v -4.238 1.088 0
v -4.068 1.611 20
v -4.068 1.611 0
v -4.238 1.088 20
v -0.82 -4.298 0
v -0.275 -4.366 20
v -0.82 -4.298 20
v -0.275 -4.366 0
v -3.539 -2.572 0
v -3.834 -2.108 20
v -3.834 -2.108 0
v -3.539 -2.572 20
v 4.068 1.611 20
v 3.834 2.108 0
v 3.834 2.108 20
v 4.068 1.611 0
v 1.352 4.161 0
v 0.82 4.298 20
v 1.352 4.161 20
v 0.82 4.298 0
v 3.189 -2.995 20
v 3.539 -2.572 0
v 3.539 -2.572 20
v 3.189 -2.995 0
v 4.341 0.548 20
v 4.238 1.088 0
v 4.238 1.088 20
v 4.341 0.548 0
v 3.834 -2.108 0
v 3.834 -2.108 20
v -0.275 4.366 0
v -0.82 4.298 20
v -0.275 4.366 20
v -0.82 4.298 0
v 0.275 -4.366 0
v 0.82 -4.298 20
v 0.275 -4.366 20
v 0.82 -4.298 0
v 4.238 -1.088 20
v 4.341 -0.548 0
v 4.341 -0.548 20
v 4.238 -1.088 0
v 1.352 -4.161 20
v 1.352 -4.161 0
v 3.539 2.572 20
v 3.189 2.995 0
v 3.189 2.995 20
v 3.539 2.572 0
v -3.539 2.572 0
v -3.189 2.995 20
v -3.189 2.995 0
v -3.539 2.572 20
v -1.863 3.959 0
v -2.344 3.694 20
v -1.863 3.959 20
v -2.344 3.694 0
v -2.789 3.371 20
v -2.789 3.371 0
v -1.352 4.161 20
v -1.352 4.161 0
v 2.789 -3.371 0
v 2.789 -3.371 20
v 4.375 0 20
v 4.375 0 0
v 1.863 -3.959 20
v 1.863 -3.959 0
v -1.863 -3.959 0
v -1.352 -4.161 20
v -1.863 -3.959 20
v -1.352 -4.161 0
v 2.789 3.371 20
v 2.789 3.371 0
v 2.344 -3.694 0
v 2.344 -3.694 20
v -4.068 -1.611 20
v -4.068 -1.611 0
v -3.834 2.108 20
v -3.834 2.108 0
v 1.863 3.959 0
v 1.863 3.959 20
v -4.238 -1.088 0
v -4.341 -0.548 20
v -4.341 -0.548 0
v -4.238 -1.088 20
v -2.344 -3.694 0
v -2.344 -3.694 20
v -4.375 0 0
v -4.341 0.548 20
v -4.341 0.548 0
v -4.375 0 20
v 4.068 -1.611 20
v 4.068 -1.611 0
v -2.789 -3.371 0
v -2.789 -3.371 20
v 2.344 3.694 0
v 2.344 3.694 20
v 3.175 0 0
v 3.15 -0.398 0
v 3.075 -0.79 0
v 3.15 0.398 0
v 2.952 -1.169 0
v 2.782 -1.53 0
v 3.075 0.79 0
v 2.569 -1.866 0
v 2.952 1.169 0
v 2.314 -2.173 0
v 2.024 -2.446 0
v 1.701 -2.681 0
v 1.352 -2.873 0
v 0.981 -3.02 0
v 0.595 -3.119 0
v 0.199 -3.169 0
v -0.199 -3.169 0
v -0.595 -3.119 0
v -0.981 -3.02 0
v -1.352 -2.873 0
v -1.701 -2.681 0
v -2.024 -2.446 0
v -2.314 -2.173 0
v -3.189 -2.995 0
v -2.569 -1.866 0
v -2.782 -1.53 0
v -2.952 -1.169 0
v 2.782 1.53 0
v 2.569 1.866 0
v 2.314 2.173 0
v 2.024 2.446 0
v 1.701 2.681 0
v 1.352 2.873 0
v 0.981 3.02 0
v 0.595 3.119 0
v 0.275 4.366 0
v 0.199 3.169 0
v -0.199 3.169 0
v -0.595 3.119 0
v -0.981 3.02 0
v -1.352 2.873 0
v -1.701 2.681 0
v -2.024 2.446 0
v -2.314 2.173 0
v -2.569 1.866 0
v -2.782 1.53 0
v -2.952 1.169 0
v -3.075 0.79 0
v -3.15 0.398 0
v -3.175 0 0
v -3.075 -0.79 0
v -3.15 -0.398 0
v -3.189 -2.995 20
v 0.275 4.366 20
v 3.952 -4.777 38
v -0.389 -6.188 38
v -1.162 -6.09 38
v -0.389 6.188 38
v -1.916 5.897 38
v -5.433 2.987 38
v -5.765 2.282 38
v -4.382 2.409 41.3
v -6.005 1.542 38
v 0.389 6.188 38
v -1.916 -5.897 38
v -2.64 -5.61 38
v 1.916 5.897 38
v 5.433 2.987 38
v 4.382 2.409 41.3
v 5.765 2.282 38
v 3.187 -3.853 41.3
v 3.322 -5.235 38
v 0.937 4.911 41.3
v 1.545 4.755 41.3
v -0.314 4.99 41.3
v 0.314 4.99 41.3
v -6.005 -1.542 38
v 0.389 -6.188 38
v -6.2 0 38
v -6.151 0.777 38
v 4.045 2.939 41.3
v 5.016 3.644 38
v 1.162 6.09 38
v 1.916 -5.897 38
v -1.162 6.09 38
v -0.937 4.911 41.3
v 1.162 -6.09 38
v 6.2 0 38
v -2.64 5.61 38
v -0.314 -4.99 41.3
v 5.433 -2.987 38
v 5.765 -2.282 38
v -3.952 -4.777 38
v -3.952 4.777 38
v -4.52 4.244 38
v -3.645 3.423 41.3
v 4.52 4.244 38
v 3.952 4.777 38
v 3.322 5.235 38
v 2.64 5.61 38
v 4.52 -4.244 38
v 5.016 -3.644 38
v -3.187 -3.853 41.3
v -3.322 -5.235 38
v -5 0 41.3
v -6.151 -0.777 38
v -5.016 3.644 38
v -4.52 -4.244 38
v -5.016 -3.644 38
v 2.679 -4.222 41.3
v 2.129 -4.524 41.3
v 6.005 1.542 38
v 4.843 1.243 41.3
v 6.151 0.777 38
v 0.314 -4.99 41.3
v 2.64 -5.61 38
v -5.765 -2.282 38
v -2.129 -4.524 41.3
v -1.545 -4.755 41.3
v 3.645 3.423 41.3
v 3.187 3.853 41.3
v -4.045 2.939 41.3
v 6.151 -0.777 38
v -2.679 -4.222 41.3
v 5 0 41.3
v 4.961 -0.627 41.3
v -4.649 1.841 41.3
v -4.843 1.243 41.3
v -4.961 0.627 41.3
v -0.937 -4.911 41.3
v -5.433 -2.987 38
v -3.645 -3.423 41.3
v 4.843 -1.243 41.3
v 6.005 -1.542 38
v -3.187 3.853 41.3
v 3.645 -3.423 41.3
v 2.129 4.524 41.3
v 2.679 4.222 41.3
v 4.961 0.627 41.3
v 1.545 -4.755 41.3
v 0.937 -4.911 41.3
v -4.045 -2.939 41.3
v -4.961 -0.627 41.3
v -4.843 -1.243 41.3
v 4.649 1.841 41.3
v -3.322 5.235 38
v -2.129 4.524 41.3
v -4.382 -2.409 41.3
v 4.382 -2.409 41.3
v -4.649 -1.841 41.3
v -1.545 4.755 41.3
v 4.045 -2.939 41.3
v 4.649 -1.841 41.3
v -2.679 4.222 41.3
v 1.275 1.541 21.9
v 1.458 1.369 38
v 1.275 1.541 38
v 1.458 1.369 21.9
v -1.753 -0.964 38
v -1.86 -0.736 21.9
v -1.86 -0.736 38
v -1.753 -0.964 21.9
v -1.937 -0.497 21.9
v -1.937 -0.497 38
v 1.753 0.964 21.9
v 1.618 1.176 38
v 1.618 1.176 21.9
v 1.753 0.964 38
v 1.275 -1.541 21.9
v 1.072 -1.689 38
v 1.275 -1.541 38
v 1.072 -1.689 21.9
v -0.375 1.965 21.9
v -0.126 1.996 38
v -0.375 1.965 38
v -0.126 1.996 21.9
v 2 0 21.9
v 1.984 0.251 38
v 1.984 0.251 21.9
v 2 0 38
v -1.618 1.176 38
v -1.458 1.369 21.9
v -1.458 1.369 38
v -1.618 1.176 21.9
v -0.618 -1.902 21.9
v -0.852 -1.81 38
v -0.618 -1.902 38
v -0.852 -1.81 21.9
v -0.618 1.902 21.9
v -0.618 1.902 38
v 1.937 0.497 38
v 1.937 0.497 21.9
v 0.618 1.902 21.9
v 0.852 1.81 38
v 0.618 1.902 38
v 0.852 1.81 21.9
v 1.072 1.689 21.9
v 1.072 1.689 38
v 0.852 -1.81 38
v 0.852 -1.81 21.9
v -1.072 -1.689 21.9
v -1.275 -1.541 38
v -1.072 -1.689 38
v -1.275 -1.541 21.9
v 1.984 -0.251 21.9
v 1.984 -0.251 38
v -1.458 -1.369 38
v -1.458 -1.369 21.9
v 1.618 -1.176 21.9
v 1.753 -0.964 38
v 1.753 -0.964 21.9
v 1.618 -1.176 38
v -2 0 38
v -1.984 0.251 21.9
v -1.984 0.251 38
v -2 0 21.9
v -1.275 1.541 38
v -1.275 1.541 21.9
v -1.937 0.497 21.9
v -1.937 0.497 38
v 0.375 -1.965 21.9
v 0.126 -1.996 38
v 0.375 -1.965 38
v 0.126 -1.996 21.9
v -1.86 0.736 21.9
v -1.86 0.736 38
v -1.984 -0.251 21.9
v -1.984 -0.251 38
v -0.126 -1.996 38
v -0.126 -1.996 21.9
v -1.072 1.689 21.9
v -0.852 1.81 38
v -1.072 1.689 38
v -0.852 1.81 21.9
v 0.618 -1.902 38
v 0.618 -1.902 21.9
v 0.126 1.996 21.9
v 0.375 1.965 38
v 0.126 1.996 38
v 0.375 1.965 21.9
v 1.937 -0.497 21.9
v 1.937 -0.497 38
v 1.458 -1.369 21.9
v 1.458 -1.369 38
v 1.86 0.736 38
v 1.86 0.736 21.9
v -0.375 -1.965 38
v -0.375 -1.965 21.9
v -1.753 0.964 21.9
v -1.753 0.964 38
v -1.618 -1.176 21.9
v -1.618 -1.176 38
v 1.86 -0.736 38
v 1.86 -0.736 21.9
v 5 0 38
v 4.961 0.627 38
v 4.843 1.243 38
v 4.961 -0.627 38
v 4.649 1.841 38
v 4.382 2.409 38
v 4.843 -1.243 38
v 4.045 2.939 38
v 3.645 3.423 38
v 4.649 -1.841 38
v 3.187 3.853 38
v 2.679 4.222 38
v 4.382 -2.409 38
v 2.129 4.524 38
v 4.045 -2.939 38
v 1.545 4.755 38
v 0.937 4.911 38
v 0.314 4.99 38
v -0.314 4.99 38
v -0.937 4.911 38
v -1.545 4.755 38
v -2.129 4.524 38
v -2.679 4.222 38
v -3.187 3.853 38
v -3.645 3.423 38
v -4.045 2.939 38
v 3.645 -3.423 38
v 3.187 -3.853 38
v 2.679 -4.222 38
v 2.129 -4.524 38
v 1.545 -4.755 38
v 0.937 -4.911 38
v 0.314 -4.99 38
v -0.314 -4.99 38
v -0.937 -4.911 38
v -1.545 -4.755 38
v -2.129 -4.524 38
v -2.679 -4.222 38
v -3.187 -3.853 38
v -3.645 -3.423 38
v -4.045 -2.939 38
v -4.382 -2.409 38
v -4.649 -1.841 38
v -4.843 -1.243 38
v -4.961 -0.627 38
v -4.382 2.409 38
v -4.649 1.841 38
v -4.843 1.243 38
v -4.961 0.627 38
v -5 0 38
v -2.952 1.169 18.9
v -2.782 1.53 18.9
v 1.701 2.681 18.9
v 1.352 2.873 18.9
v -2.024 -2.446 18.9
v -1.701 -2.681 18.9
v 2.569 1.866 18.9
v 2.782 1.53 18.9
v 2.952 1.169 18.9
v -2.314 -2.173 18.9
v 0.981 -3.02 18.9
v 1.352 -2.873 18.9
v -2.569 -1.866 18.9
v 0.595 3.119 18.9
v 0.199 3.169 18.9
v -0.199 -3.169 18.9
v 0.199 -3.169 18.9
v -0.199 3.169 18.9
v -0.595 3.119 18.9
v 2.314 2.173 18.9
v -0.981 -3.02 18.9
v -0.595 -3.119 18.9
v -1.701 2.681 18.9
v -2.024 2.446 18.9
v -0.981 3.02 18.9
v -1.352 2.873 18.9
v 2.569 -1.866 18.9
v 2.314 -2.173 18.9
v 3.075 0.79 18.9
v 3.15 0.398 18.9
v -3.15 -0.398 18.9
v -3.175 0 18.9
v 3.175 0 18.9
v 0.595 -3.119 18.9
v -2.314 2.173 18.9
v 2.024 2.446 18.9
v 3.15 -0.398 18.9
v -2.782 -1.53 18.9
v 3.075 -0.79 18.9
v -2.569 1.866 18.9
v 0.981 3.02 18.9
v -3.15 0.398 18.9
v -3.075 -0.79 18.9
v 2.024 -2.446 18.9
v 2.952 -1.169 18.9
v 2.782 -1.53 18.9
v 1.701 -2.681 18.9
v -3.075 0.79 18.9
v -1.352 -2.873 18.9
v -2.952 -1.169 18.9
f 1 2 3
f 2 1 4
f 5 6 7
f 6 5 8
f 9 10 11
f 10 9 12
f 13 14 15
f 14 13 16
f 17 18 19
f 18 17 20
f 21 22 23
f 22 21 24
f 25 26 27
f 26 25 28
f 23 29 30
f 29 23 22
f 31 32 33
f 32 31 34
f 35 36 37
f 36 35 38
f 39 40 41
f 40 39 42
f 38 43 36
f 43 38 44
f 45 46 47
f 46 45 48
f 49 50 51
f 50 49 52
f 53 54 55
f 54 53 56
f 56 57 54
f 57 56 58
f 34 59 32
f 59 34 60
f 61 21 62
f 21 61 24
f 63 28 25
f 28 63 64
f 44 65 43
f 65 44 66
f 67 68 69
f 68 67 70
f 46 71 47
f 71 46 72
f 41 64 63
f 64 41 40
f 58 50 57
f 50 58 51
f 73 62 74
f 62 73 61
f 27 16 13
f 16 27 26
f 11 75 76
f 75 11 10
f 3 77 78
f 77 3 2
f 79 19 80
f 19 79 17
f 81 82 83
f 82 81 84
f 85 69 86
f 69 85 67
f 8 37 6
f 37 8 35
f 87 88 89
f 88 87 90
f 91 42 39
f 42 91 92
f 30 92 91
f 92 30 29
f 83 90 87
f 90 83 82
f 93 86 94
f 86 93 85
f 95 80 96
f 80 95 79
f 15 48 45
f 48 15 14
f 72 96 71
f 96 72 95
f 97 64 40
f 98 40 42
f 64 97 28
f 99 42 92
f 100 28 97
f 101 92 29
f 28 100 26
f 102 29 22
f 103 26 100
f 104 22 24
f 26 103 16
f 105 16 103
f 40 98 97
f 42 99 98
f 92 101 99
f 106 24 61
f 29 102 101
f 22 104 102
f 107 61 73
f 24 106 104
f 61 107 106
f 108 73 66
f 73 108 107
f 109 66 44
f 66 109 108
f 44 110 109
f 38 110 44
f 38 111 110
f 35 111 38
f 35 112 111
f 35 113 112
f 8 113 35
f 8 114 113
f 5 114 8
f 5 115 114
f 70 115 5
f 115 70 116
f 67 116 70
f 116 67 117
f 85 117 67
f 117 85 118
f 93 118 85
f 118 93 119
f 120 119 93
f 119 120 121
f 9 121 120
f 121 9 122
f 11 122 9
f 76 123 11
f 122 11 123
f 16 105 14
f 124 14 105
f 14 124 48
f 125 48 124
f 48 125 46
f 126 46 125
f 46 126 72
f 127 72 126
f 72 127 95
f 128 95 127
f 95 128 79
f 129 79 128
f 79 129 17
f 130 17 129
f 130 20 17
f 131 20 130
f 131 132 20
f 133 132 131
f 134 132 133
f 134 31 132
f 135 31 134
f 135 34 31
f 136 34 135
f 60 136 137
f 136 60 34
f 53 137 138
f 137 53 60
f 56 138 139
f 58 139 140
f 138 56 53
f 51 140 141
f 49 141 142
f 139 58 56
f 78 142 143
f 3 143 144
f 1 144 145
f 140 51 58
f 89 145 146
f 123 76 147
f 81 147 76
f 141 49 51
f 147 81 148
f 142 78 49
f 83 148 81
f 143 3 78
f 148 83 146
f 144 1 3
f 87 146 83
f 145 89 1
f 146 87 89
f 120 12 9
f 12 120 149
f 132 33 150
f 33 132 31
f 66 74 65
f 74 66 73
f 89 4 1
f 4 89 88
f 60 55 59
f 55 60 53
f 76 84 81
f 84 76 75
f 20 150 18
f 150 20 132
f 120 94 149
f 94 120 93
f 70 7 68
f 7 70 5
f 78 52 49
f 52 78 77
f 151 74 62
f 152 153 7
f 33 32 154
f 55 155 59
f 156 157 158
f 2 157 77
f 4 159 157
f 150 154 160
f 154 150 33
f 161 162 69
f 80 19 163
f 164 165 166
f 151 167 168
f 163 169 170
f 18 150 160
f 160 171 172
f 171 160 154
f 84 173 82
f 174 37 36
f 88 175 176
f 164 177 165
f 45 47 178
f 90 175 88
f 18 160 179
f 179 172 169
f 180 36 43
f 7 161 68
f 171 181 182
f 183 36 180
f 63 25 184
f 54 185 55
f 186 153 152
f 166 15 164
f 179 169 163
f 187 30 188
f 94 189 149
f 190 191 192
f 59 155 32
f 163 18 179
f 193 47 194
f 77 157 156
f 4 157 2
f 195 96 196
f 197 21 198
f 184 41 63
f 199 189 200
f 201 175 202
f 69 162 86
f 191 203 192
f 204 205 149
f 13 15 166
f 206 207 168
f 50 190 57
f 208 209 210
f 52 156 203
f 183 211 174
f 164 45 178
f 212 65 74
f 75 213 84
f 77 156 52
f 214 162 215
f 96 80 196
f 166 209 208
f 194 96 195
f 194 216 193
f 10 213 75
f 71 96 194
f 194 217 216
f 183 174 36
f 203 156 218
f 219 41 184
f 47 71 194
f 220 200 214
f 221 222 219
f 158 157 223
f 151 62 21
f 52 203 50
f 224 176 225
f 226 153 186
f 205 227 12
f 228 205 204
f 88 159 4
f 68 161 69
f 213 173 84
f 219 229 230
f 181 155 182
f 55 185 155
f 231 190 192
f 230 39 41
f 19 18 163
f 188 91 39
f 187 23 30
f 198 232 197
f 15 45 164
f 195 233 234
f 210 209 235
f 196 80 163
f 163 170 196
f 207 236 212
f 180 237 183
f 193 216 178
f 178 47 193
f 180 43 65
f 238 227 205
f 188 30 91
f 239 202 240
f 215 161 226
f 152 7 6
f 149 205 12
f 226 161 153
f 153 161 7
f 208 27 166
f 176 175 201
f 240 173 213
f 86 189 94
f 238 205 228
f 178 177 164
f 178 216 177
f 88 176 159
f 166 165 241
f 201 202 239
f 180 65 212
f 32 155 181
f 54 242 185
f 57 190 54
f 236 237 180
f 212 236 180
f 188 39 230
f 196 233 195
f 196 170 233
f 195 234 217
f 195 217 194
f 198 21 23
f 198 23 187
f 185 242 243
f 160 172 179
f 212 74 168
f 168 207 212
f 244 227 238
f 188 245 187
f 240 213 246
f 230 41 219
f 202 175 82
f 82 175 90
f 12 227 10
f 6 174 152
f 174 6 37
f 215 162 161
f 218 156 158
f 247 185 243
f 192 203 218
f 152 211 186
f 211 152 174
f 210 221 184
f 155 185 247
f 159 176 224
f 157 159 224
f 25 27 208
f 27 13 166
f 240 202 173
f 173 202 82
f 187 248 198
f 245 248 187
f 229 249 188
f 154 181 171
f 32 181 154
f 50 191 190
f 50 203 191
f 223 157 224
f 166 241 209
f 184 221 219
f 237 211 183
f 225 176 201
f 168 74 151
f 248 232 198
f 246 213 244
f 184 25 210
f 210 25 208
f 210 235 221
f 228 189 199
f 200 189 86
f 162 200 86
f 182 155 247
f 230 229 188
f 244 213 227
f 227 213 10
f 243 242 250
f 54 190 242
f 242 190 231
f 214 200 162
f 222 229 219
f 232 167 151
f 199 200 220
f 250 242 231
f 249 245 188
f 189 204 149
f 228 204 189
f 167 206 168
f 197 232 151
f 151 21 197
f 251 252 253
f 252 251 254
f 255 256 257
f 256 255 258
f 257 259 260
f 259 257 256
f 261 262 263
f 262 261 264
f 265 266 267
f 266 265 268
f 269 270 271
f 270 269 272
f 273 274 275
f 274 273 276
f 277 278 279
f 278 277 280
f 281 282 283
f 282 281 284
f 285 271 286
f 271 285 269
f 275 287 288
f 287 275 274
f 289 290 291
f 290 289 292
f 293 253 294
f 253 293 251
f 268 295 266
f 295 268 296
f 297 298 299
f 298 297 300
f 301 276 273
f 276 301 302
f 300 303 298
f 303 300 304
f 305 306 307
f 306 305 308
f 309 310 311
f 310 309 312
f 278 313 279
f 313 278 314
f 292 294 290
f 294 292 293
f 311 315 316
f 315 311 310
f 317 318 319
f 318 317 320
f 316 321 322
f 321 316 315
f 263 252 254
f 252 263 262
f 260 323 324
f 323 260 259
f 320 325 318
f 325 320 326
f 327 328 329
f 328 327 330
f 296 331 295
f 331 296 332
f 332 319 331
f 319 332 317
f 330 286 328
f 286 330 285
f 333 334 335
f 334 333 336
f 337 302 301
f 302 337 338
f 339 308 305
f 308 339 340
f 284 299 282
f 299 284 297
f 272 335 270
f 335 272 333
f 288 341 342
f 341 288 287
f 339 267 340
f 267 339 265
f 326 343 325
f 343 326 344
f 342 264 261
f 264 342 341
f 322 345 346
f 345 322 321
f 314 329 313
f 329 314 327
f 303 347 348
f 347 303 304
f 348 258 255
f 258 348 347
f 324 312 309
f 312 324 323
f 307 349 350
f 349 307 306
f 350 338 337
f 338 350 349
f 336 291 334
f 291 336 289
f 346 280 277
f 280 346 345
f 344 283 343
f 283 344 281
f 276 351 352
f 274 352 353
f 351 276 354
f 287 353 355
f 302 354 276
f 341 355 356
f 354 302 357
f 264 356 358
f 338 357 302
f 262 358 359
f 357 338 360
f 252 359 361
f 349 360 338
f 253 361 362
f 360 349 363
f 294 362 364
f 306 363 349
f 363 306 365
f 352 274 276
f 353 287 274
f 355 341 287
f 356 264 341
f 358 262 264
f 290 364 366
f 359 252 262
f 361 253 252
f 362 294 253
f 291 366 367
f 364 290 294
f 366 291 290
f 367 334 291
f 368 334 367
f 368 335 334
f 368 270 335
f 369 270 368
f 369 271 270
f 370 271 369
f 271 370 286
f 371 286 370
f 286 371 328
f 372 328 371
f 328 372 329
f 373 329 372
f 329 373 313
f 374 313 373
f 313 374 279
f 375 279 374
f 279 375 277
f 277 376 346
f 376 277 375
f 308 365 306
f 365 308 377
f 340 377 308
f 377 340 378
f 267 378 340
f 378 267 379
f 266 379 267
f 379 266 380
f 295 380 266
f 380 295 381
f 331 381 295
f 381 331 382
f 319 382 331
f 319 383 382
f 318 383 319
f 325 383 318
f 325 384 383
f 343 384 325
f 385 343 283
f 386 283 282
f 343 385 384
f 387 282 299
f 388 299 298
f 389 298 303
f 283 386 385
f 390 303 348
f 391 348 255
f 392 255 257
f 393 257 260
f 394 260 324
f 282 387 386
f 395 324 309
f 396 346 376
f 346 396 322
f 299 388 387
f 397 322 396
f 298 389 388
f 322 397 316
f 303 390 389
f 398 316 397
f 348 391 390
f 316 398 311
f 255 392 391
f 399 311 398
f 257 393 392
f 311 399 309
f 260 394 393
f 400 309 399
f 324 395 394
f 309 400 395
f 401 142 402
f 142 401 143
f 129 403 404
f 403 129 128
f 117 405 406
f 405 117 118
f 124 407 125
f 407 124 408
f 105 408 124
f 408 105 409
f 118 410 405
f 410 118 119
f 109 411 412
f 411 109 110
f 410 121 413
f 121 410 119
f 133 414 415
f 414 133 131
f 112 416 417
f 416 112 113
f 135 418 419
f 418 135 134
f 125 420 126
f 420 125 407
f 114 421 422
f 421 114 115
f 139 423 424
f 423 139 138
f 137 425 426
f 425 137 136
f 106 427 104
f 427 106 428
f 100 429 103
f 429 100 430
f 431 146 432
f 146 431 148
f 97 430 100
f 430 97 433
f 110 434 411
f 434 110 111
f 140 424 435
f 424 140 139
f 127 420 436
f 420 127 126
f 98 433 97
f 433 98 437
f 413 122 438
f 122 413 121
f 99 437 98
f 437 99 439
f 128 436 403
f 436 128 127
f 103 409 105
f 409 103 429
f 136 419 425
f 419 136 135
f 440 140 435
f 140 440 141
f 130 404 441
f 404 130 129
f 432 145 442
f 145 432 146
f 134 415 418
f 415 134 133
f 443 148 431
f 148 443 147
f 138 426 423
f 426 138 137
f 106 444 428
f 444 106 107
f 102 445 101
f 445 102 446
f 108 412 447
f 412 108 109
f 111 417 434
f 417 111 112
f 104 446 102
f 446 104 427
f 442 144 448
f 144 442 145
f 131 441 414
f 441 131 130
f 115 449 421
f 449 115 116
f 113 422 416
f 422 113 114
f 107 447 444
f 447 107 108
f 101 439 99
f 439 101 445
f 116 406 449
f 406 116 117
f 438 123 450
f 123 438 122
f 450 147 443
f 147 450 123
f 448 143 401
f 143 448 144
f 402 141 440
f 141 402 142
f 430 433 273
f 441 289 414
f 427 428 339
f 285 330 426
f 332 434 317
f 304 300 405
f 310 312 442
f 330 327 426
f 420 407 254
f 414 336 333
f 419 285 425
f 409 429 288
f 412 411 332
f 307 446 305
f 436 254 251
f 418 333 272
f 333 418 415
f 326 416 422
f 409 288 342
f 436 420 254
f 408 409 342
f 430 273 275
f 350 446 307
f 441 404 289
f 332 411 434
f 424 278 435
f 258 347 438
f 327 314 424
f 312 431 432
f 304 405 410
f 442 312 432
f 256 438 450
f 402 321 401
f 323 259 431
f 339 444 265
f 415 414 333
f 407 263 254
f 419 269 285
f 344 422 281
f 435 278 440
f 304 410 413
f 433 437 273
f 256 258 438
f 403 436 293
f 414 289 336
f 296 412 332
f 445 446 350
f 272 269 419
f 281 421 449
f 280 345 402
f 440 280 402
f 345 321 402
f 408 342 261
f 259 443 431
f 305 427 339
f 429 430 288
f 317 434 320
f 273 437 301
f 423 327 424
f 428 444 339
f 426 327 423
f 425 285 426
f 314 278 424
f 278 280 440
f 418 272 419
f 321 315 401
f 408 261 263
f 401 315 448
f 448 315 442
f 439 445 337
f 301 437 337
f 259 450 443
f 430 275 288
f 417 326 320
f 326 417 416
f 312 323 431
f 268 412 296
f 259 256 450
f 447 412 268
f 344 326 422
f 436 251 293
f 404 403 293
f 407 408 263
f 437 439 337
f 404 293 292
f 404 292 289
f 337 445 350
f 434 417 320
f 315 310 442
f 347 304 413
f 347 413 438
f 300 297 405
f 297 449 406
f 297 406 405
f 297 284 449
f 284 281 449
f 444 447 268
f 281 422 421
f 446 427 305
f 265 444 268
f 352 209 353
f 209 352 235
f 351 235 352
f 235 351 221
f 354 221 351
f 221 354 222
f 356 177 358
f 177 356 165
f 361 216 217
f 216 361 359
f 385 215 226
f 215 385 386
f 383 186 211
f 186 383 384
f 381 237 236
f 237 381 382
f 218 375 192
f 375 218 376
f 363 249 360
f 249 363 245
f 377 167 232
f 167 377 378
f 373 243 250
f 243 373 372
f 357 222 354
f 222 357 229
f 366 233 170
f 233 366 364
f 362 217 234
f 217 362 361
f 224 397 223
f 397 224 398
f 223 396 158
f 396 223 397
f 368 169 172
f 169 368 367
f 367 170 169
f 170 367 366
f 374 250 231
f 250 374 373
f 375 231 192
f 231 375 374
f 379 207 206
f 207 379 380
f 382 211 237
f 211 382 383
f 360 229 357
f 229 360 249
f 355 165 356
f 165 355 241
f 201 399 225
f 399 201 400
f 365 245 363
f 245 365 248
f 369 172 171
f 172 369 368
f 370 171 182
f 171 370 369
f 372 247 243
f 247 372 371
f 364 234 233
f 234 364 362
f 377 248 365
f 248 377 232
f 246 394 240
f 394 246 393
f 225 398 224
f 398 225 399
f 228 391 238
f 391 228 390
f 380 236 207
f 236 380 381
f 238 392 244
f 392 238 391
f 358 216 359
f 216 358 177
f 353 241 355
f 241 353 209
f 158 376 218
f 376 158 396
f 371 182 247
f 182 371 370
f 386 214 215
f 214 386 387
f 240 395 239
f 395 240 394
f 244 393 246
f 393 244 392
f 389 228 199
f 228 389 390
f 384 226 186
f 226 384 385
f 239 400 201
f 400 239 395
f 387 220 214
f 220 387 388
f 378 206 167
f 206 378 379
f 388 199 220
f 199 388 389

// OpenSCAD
ROD_DIA = 6.35;
ROD_SIDE_LENGTH = 35; // 25;
ROD_SIDE_OFFSET = 20; // 10;

BALL_DIA = 10.2;
BALL_SIDE_LENGTH = 15;
BALL_OFFSET = 26;

MAGNET_DIA = 10;
MAGNET_THICKNESS = 3.3;
MAGNET_OFFSET = 12;
MAGNET_HOLE_DIA = 4;

SPRING_HOLE = false;
SPRING_HOLE_DIA = 2;
SPRING_HOLE_THICKNESS = 2.5;
SPRING_HOLE_OFFSET = 5.5;

WALL_THICKNESS = 1.2;


$fn = 50;

difference() {
  union() {
    cylinder(d = ROD_DIA + 2 * WALL_THICKNESS, h = ROD_SIDE_LENGTH);

    if(SPRING_HOLE) {
      translate([SPRING_HOLE_OFFSET, 0, 0])
      cylinder(d = SPRING_HOLE_DIA + 2 * WALL_THICKNESS, h = SPRING_HOLE_THICKNESS);
    }

    hull() {
      translate([0, 0, ROD_SIDE_OFFSET])
      cylinder(d = ROD_DIA + 2 * WALL_THICKNESS, h = ROD_SIDE_LENGTH - ROD_SIDE_OFFSET);

      translate([0, 0, ROD_SIDE_LENGTH + BALL_SIDE_LENGTH - MAGNET_OFFSET])
      cylinder(d1 = MAGNET_DIA + 2 * WALL_THICKNESS, d2 = MAGNET_DIA, h = MAGNET_THICKNESS);
    }
  }

  #cylinder(d = MAGNET_HOLE_DIA, h = ROD_SIDE_LENGTH + BALL_SIDE_LENGTH - MAGNET_OFFSET);
  #cylinder(d = ROD_DIA, h = ROD_SIDE_LENGTH + BALL_SIDE_LENGTH - BALL_OFFSET - BALL_DIA/2);
  #translate([0, 0, ROD_SIDE_LENGTH + BALL_SIDE_LENGTH - BALL_OFFSET - BALL_DIA/2])
  cylinder(d1 = ROD_DIA, d2 = MAGNET_HOLE_DIA, h = 3);

  #translate([0, 0, ROD_SIDE_LENGTH + BALL_SIDE_LENGTH - BALL_DIA/2])
  sphere(d = BALL_DIA);

  if(SPRING_HOLE) {
    #translate([SPRING_HOLE_OFFSET, 0, 0])
    cylinder(d = SPRING_HOLE_DIA, h = SPRING_HOLE_THICKNESS);
  }

  #translate([0, 0, ROD_SIDE_LENGTH + BALL_SIDE_LENGTH - MAGNET_OFFSET])
  cylinder(d = MAGNET_DIA, h = MAGNET_THICKNESS);
}
